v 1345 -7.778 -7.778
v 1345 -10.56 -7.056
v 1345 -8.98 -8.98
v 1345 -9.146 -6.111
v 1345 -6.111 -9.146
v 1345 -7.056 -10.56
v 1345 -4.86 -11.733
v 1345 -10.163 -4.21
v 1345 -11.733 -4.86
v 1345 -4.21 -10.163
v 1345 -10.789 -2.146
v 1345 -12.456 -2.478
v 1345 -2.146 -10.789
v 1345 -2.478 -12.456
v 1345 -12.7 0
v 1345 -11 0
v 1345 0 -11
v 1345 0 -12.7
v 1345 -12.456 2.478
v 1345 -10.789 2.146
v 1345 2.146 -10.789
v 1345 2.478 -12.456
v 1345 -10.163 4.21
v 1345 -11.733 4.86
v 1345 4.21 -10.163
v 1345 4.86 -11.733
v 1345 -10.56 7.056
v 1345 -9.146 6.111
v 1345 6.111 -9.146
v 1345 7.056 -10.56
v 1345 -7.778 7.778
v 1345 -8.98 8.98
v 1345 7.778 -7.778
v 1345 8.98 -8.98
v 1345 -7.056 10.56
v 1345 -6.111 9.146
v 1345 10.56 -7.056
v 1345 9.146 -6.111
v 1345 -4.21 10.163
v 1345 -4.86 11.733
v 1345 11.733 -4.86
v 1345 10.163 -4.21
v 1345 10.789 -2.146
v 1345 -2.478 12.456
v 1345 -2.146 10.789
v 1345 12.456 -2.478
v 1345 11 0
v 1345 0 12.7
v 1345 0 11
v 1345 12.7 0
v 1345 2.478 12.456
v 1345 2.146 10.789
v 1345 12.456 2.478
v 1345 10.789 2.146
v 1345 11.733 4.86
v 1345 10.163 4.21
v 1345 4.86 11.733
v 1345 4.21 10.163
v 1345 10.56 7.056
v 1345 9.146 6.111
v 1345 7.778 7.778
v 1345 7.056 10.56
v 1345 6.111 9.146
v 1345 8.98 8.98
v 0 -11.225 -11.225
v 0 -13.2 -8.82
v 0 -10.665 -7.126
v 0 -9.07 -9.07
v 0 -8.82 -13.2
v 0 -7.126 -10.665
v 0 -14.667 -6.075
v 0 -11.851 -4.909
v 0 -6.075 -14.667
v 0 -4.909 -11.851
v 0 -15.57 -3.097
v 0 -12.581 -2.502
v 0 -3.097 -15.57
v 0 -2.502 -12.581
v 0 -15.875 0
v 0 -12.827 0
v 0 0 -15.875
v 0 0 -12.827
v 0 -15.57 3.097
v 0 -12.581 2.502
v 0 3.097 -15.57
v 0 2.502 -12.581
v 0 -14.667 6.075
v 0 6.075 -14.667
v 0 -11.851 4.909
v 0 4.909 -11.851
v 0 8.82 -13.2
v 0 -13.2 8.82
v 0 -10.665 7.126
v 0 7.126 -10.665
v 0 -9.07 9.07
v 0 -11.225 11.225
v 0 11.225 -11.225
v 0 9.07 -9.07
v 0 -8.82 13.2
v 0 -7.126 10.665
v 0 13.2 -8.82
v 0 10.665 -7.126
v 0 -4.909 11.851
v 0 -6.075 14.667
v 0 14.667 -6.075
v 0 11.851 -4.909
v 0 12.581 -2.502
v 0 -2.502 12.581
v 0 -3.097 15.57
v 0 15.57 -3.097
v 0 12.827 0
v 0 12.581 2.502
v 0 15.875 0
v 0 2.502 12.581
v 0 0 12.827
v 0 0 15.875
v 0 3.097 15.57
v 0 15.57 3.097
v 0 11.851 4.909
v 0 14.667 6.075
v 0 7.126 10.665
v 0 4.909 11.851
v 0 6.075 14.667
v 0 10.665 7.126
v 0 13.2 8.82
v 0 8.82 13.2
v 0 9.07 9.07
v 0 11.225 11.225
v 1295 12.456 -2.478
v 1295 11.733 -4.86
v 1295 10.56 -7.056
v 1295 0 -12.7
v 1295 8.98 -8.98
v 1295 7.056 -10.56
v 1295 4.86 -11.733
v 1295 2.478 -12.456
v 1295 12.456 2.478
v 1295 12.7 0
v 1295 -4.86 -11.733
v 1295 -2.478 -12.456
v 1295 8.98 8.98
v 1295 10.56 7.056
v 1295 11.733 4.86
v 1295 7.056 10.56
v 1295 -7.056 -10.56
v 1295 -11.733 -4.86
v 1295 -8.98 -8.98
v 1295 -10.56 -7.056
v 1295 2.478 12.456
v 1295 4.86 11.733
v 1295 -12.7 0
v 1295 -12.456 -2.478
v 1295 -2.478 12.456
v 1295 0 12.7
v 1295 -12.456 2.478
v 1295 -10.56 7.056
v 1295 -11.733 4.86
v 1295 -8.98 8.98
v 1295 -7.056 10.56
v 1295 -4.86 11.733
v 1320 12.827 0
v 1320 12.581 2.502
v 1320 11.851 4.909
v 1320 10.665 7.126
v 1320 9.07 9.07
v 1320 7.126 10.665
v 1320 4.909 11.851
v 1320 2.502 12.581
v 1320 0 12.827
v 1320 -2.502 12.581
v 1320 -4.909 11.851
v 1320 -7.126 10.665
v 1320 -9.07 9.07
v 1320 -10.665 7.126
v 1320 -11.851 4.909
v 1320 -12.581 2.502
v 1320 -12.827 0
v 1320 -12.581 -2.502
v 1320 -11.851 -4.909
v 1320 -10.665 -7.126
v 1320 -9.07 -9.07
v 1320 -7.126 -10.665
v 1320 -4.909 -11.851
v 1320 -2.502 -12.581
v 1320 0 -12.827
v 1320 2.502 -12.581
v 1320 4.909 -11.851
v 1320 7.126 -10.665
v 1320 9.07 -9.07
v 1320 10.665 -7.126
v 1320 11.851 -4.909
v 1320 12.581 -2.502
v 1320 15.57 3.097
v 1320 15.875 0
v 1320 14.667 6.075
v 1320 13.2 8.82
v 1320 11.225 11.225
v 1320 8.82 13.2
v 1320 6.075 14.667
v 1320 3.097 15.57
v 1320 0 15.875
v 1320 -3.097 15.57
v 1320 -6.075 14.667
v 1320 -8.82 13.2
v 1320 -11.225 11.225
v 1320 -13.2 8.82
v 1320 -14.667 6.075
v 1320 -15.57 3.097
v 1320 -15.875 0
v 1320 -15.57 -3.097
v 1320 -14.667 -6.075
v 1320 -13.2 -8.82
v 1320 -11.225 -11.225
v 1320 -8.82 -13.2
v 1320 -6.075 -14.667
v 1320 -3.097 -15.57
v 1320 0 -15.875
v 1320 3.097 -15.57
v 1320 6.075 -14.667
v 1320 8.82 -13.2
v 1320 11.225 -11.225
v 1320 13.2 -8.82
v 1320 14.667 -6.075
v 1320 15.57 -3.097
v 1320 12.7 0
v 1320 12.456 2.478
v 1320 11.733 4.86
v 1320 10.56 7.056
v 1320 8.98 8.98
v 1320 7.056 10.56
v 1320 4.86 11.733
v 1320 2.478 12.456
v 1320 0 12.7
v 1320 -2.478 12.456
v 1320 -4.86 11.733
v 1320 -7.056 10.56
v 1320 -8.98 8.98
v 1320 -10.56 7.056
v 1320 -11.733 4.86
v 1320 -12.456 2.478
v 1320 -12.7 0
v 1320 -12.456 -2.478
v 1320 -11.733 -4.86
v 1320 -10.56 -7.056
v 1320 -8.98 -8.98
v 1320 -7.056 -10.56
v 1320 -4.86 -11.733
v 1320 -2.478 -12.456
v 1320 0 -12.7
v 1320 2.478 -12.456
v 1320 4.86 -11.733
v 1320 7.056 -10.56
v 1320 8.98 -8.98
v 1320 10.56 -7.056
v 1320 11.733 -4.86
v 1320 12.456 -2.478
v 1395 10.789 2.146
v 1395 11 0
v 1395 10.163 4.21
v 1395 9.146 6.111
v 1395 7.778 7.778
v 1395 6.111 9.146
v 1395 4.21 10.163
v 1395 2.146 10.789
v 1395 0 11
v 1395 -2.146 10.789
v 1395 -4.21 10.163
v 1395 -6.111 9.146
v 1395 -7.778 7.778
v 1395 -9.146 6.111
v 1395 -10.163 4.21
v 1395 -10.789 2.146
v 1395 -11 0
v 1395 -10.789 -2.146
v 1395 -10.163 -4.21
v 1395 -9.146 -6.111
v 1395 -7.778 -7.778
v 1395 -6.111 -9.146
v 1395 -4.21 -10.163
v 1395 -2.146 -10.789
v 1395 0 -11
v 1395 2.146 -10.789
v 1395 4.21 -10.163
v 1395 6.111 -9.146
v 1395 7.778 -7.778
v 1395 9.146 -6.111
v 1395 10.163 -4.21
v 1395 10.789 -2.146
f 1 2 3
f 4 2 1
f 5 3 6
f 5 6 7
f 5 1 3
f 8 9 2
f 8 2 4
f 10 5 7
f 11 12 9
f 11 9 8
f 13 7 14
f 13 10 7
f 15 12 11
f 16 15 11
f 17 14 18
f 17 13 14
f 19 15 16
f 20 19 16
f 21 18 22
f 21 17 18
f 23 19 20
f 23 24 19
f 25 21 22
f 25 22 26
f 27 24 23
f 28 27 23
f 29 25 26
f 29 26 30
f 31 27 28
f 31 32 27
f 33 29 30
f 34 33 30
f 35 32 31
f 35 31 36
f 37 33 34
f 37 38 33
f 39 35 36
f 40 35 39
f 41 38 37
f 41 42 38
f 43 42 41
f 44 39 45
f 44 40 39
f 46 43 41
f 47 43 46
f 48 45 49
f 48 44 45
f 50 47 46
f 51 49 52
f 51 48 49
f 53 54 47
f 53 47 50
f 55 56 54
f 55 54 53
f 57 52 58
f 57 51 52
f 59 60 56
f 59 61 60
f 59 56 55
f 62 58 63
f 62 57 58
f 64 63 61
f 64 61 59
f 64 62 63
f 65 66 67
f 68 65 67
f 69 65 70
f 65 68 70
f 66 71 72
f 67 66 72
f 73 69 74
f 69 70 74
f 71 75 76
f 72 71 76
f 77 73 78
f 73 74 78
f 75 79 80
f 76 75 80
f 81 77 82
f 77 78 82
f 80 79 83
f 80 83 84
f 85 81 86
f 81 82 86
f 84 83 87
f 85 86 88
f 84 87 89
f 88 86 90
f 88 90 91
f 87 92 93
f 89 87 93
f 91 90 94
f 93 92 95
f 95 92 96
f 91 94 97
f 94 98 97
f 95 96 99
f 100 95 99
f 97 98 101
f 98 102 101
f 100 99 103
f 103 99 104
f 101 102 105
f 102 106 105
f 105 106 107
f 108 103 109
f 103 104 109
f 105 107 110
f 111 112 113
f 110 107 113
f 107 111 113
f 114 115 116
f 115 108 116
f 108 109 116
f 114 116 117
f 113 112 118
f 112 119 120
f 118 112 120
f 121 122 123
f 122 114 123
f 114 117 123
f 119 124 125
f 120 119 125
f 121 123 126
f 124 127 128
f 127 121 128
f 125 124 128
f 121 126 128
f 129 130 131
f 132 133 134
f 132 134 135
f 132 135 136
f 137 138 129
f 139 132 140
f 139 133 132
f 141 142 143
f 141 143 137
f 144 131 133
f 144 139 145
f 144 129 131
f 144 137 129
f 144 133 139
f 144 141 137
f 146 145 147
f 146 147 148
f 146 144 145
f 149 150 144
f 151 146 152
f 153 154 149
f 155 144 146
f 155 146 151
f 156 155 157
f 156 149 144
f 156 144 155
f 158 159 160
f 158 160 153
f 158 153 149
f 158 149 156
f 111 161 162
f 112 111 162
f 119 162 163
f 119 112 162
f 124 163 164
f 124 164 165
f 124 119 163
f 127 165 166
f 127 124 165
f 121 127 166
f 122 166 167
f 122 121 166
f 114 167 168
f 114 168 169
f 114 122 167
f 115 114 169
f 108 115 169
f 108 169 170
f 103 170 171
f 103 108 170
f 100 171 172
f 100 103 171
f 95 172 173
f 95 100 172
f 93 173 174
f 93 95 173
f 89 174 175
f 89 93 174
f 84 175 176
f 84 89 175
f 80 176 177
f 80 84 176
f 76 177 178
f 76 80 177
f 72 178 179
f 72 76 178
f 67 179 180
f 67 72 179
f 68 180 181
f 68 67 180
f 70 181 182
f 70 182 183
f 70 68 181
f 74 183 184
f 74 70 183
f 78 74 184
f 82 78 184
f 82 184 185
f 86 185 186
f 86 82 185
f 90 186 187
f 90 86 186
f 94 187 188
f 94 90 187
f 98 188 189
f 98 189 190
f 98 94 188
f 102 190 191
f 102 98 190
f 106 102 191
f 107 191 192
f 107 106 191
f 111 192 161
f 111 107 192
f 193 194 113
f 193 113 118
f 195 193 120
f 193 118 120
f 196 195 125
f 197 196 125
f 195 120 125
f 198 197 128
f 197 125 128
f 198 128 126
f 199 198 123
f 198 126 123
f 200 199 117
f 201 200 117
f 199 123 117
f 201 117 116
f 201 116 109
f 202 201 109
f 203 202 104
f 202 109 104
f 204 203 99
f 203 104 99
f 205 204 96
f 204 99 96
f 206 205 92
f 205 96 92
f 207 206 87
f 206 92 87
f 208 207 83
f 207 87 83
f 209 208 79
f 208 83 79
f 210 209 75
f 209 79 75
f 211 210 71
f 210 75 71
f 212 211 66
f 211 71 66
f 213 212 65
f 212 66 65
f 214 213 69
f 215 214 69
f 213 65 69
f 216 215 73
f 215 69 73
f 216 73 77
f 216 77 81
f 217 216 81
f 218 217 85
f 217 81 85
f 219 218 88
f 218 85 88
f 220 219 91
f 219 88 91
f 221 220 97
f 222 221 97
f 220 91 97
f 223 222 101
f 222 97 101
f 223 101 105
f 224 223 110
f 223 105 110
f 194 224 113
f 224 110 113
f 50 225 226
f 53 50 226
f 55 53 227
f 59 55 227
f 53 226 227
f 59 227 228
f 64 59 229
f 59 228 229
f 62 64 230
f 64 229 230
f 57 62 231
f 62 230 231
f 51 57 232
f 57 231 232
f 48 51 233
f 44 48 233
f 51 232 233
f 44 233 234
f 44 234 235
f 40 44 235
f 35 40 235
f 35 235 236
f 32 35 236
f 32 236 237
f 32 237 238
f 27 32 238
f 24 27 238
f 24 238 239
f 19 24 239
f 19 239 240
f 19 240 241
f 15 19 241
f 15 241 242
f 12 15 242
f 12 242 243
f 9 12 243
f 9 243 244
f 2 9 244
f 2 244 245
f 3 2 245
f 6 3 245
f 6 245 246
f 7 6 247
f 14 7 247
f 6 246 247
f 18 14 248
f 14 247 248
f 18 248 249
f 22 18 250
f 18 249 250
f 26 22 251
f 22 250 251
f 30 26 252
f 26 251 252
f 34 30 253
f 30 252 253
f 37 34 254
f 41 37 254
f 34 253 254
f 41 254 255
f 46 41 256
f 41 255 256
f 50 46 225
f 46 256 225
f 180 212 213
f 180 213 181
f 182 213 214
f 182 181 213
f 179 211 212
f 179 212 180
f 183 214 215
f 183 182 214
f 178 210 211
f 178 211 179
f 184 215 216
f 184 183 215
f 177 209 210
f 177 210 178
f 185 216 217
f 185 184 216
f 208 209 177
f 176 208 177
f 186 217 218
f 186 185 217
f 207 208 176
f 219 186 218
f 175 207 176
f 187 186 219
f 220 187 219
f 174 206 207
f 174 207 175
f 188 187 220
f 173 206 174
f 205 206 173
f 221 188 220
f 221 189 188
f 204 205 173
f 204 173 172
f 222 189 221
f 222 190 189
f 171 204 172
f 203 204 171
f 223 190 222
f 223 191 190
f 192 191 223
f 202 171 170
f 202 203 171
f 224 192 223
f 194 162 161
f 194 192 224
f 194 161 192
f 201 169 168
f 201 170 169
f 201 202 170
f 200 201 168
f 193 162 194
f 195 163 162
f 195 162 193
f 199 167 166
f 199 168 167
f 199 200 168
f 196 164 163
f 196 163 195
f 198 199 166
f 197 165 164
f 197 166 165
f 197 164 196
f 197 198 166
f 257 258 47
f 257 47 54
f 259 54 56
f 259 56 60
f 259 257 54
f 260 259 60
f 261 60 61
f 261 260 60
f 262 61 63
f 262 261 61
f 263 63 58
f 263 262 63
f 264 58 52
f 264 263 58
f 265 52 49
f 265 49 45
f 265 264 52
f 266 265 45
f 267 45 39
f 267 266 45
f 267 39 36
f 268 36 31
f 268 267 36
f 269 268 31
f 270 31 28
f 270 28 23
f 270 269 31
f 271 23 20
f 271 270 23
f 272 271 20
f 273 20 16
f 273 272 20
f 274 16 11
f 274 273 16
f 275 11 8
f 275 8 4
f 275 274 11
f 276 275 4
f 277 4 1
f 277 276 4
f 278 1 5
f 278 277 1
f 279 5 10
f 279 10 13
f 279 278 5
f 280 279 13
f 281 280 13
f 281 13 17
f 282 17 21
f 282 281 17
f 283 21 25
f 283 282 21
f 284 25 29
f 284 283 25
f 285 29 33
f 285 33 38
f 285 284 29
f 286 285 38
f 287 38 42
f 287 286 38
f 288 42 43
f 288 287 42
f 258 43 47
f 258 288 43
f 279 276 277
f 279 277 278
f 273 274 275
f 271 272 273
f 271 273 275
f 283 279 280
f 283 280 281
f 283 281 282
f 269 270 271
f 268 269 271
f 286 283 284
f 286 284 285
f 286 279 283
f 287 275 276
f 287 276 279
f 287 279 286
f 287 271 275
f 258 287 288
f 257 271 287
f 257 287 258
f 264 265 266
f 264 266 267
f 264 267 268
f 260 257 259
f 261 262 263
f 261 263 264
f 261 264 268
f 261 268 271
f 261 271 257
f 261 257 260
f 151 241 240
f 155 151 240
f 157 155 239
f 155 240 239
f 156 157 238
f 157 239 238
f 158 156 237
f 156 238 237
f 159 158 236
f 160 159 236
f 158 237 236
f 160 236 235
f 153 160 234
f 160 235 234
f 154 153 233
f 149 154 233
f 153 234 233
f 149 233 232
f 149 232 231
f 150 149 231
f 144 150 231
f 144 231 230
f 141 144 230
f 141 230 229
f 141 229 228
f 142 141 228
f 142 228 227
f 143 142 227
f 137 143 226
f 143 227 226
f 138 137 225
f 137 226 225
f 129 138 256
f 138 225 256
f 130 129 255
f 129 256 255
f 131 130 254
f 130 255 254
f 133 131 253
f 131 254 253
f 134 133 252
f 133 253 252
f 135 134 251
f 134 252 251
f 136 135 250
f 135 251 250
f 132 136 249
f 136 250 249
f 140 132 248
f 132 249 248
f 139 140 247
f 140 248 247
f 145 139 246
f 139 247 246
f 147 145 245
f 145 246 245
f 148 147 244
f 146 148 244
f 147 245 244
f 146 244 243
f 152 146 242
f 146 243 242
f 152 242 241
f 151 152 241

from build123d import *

# Parameters (mm, degrees)
F0_R     = 15.875
F0_R_2   = 12.827
F1_DEPTH = 1320
F2_R     = 12.7
F3_DEPTH = 75
F4_R     = 12.7
F4_R_2   = 11
F5_DEPTH = 50
F6_R     = 12.7
F7_DEPTH = 25


with BuildPart() as f1:
    # F0 (on Right) → F1 (new body)
    with BuildSketch(Plane.YZ):
        Circle(F0_R)
        Circle(F0_R_2, mode=Mode.SUBTRACT)
    extrude(amount=F1_DEPTH)


with BuildPart() as f3:
    # F2 (on face) → F3 (new body)
    with BuildSketch(Plane.YZ.offset(1320)):
        Circle(F2_R)
    extrude(amount=F3_DEPTH)

    # F4 (on face) → F5 (cut)
    with BuildSketch(Plane.YZ.offset(1395)):
        Circle(F4_R)
        Circle(F4_R_2, mode=Mode.SUBTRACT)
    extrude(amount=-F5_DEPTH, mode=Mode.SUBTRACT)

    # F6 (on face) → F7 (join)
    with BuildSketch(Plane(origin=(1320, 0, 0), x_dir=(0, -1, 0), z_dir=(-1, 0, 0))):
        Circle(F6_R)
    extrude(amount=F7_DEPTH)


solid = Compound([f1.part, f3.part])
